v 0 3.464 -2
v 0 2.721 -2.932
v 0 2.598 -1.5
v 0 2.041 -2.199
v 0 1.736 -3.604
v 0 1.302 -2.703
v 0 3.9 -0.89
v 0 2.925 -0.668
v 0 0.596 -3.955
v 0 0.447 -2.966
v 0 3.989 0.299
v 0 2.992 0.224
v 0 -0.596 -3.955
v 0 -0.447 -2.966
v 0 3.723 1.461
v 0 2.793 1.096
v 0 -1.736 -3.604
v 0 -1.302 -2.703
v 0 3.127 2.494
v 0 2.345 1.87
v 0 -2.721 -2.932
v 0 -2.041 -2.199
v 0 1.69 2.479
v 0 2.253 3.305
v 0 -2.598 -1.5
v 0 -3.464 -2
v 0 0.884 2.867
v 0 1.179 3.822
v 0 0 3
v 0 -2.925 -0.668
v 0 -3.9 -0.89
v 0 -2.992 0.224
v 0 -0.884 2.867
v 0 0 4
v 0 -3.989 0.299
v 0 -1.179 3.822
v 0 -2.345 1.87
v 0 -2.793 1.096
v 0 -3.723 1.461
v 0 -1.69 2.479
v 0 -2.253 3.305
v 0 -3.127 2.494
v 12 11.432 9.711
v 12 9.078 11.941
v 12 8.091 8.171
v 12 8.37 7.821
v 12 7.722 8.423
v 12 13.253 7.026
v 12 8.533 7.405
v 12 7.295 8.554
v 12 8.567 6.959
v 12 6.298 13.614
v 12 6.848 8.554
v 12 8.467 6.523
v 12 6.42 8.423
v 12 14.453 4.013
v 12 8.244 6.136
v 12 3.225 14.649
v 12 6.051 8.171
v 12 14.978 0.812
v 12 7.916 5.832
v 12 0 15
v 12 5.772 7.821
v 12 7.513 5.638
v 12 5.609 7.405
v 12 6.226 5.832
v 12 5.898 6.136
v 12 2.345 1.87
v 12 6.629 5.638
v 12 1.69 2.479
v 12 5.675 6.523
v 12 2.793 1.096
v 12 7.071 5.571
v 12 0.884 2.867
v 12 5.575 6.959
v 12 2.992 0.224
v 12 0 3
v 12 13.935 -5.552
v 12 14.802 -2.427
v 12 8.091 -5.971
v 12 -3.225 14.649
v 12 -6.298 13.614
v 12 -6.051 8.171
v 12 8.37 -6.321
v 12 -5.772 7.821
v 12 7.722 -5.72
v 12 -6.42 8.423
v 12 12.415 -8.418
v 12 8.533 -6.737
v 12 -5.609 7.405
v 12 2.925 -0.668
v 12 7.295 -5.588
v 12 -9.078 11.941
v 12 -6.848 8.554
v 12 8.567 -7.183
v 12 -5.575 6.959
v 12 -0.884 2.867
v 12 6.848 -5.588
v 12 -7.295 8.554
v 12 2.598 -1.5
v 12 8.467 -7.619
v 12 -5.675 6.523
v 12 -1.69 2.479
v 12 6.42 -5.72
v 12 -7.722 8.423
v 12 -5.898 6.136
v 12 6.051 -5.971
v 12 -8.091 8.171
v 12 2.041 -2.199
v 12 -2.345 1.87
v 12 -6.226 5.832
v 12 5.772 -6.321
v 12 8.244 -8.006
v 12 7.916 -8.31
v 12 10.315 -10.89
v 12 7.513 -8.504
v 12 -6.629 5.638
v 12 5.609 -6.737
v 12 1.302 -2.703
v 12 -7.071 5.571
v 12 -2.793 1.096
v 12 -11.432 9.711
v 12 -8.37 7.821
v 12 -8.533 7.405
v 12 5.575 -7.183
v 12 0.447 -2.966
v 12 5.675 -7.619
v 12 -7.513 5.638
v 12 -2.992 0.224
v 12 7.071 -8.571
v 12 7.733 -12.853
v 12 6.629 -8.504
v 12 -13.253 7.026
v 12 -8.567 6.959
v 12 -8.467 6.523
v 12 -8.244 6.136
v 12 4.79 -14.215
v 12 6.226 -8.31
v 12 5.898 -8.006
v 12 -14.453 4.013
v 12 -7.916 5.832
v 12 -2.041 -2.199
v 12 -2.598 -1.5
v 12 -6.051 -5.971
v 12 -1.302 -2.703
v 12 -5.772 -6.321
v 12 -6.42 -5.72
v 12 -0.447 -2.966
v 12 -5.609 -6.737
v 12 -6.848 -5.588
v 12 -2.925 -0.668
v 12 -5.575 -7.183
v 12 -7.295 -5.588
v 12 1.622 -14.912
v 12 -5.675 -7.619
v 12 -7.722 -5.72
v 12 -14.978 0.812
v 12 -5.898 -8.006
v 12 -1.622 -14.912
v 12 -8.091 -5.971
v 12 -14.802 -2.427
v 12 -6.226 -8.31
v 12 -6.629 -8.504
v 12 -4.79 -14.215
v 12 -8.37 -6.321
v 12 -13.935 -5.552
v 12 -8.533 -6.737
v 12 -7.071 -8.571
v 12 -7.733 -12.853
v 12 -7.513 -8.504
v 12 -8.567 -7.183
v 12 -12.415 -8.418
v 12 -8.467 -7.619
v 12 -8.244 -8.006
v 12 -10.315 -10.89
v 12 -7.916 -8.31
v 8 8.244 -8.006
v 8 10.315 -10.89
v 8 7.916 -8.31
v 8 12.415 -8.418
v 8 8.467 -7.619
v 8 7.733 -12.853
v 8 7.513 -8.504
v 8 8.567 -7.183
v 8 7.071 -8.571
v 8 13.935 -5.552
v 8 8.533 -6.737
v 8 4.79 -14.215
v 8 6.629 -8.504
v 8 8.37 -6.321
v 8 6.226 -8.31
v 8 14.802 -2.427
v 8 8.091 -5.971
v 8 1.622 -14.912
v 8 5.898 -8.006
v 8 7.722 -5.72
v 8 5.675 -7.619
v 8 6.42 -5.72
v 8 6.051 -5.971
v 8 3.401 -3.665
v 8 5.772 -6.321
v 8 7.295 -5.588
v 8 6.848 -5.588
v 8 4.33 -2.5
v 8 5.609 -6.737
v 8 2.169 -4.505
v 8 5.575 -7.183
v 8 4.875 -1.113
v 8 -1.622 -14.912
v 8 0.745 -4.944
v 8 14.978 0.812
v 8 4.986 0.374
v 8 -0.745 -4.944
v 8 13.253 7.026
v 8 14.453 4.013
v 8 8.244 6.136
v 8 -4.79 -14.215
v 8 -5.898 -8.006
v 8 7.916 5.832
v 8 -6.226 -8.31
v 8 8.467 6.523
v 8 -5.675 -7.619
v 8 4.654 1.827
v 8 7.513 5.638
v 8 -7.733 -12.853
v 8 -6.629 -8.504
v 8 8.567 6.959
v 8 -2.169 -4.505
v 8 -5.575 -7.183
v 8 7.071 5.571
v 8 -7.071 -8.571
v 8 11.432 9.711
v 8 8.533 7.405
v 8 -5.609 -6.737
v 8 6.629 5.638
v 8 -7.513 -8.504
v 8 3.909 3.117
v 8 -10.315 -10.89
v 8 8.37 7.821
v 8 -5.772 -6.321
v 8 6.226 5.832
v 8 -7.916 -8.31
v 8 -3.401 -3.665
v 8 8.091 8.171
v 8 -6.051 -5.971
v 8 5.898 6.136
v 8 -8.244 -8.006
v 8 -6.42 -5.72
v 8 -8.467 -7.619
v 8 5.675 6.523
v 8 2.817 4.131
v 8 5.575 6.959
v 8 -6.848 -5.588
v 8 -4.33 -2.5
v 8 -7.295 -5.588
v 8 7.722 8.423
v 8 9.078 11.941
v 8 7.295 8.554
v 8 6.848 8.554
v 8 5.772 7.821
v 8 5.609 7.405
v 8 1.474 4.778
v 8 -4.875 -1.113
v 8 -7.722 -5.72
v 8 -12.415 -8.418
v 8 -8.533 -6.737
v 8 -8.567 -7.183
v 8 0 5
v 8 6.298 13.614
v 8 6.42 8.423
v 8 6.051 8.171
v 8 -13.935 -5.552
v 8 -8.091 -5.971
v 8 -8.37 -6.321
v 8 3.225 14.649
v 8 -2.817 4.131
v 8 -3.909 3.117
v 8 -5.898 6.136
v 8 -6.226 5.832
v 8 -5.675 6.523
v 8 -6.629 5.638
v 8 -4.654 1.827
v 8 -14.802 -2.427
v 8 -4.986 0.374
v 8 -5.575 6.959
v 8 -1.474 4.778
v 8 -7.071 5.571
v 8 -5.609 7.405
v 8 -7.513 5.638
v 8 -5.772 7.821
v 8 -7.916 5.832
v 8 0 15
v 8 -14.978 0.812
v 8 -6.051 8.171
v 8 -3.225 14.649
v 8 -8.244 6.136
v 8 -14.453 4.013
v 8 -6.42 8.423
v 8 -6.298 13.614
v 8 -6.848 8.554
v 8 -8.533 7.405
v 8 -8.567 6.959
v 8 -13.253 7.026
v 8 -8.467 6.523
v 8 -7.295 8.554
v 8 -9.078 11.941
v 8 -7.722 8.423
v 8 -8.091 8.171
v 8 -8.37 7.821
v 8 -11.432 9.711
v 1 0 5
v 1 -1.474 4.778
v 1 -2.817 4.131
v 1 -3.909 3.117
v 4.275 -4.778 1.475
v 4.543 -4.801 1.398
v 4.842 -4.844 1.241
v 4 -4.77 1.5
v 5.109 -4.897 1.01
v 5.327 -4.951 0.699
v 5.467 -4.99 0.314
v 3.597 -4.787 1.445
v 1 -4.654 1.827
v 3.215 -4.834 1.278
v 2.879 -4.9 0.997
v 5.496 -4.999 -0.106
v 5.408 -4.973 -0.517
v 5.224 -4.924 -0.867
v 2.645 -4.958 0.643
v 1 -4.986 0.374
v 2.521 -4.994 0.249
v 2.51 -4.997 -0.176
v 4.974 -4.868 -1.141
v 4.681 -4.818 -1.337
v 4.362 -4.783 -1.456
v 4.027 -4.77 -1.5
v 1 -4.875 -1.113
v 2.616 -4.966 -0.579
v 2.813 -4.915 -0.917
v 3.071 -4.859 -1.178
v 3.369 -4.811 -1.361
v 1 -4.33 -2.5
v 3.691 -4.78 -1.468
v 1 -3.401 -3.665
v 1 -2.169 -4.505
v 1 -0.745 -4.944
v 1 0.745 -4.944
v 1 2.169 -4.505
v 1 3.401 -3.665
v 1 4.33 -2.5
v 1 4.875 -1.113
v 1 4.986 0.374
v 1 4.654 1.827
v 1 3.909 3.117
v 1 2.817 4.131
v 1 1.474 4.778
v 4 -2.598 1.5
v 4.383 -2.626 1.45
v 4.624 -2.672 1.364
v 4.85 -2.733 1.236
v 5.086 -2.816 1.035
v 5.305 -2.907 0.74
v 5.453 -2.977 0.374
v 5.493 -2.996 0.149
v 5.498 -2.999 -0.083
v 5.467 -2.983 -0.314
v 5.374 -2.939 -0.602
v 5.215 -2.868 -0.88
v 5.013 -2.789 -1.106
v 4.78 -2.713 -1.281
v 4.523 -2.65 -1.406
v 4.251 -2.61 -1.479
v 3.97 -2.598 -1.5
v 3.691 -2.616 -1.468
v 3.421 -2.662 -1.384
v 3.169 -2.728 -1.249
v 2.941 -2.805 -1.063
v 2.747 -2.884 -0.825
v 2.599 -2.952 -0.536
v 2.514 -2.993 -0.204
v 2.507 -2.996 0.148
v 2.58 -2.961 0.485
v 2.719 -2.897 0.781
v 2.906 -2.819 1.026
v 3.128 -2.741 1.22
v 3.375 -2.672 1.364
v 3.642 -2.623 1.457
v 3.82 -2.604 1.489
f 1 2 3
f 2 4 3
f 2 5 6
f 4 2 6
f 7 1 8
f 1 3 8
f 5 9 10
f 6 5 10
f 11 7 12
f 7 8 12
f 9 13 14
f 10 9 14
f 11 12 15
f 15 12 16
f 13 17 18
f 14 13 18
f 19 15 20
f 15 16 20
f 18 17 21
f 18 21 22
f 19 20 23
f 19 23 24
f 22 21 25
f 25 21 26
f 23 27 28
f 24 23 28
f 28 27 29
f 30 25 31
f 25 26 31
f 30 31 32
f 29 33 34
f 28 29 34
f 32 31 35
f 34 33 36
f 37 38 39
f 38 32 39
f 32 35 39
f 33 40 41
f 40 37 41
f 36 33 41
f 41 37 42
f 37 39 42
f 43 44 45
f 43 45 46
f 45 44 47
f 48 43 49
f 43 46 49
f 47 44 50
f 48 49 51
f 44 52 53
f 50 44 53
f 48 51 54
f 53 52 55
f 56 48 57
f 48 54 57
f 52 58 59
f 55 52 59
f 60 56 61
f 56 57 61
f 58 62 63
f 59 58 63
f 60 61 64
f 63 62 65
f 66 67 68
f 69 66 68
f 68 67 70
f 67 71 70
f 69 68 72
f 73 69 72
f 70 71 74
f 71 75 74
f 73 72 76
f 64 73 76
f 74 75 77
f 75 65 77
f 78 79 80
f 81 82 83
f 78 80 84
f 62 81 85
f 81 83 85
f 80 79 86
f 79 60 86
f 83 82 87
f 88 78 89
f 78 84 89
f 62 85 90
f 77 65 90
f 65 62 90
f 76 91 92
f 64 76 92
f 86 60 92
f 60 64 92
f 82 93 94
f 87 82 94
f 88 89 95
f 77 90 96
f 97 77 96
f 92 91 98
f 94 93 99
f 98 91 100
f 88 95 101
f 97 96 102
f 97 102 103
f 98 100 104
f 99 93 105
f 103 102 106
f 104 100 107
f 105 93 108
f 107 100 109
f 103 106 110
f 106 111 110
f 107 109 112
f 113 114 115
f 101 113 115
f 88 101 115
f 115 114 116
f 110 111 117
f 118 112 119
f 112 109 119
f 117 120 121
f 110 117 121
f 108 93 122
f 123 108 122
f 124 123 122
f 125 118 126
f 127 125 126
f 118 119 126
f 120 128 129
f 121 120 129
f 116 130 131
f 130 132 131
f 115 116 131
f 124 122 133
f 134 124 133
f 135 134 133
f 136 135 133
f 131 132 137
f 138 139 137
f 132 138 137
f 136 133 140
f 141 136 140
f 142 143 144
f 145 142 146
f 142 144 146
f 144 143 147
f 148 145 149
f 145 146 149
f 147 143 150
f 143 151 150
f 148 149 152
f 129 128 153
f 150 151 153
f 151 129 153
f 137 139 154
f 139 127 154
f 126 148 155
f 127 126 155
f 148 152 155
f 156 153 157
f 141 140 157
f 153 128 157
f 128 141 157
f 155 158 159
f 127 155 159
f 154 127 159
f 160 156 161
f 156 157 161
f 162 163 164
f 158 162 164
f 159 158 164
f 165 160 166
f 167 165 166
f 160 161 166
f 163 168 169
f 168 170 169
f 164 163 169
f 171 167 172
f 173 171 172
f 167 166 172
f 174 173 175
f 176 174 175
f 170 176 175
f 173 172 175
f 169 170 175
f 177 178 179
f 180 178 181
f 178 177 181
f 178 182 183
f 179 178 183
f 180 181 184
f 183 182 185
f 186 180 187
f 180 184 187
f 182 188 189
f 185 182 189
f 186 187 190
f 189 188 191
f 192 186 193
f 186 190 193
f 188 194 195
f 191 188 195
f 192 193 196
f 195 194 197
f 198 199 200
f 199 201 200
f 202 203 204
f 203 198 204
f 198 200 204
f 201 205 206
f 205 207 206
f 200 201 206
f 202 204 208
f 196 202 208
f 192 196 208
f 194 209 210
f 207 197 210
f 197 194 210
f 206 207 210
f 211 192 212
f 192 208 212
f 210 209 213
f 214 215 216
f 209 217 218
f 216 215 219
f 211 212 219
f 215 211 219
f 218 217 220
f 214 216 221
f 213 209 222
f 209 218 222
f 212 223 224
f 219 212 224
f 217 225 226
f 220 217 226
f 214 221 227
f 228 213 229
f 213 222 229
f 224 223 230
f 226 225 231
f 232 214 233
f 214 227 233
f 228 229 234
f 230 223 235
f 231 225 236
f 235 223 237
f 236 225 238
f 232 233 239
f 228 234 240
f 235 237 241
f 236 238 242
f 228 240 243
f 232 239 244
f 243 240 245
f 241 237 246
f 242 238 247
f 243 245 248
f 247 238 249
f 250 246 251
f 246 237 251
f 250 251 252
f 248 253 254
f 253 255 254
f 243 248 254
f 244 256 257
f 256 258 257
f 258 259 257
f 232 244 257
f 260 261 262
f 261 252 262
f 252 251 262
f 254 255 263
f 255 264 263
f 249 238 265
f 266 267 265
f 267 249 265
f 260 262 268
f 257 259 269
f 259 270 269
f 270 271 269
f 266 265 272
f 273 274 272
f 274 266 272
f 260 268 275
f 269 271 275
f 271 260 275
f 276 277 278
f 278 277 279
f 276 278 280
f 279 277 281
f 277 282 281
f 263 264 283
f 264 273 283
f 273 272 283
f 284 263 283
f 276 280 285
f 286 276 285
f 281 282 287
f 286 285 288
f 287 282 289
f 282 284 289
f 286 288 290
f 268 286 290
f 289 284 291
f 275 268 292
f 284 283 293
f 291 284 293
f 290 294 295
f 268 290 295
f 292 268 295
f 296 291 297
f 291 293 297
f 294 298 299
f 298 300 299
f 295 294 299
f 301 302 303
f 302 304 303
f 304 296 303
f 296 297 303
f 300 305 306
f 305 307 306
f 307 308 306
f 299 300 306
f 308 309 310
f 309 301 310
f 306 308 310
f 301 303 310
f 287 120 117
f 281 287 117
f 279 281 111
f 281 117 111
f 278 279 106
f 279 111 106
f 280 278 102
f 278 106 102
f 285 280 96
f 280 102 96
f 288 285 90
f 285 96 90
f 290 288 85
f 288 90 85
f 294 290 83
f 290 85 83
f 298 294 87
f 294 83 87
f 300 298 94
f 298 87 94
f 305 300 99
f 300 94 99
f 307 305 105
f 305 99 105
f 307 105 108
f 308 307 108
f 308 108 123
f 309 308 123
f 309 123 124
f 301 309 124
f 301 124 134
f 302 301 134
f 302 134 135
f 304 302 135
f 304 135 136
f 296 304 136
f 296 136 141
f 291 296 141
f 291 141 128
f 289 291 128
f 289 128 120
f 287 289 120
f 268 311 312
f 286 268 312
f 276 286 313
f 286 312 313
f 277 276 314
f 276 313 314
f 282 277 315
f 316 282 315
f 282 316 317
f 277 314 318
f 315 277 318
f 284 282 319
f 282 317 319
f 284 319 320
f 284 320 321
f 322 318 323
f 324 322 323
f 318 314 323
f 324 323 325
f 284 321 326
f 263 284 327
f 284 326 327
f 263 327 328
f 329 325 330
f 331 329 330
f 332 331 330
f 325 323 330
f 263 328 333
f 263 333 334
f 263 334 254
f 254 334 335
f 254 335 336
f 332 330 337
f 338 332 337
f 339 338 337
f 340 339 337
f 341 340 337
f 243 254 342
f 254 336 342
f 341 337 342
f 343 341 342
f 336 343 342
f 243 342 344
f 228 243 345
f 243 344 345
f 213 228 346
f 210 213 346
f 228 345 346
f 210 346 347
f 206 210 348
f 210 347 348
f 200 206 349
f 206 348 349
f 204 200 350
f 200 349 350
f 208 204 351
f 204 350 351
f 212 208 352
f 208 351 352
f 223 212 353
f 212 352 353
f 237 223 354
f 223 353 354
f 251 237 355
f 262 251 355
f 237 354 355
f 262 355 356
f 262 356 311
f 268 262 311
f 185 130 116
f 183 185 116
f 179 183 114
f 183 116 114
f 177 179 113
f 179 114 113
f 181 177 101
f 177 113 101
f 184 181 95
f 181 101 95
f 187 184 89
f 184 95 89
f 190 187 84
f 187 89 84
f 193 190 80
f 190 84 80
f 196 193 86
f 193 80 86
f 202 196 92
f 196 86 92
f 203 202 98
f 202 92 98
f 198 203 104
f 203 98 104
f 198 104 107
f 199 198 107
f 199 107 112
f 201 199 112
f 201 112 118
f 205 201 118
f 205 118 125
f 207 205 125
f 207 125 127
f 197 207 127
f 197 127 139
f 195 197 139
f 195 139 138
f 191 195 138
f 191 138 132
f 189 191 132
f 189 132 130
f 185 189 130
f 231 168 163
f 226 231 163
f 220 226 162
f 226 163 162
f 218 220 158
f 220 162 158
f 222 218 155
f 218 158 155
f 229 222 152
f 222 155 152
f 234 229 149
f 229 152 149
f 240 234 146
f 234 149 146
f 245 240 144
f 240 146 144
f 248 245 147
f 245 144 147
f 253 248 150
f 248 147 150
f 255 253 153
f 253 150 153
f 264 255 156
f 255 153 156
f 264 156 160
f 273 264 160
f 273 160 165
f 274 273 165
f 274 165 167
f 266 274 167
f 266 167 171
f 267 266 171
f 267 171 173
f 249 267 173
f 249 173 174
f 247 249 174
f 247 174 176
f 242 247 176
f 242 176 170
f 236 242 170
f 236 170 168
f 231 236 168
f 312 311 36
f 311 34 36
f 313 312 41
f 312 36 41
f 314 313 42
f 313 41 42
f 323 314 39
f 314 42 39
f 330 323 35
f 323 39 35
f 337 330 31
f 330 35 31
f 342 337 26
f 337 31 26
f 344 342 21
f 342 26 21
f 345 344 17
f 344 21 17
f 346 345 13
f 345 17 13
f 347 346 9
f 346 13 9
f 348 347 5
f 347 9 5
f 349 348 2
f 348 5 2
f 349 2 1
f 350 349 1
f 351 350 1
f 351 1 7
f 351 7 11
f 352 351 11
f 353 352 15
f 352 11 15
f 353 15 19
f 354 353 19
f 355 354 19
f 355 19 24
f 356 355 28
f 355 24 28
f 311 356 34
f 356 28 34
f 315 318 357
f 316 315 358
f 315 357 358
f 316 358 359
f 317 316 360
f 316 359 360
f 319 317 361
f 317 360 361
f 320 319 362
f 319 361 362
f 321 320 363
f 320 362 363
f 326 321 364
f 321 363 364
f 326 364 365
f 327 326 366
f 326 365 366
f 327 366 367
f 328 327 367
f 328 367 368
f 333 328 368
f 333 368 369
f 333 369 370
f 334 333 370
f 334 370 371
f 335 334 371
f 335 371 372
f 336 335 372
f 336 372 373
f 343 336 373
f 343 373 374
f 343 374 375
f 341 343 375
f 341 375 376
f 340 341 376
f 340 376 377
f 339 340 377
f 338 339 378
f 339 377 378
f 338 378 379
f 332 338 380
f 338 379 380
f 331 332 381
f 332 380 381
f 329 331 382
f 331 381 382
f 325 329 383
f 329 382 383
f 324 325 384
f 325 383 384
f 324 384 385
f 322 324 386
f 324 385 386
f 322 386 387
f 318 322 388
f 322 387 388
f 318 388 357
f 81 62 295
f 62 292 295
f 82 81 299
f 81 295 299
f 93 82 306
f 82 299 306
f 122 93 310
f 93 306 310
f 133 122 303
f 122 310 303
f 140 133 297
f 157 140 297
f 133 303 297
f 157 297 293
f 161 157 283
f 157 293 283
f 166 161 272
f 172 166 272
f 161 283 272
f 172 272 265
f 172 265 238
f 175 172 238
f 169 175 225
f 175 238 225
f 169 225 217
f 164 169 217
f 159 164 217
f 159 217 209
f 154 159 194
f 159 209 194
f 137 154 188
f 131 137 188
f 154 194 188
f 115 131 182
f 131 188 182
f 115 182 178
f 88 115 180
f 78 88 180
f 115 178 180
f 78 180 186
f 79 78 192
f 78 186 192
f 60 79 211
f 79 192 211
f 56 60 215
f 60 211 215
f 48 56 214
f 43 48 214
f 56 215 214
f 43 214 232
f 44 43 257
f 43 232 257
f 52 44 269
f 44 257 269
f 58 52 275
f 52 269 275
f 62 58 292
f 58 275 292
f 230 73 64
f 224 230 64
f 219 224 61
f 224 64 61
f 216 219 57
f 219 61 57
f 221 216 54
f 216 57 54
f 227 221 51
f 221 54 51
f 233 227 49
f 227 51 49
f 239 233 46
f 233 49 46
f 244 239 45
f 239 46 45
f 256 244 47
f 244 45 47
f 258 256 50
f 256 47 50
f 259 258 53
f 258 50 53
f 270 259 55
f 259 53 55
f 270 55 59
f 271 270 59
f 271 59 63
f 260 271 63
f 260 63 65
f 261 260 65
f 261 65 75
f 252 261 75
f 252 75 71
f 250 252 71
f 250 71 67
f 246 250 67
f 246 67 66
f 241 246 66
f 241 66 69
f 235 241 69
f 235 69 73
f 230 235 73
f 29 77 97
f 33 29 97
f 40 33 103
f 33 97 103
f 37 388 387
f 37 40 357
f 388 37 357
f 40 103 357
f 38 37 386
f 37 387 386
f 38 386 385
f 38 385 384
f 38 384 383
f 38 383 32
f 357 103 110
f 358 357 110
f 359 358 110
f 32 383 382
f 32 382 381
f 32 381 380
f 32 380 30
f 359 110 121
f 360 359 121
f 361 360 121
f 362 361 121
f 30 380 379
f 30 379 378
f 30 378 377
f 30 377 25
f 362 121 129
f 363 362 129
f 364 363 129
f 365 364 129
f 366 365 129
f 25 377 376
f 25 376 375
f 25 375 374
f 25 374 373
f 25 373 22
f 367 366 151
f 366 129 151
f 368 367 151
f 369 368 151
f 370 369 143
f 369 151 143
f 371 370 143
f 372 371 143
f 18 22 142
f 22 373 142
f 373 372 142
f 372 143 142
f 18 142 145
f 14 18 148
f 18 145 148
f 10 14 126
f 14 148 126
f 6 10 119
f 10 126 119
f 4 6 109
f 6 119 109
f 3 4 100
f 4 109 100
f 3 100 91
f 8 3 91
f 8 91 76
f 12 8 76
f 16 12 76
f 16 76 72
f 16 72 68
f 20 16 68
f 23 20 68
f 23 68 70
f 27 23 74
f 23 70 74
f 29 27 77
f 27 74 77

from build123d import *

# Parameters (mm, degrees)
SKETCH2_R          = 1.5
CUT_EXTRUDE1_DEPTH = 5
SKETCH3_R          = 1.5
CUT_EXTRUDE2_DEPTH = 25.372115263


with BuildPart() as part:
    # Sketch1 → Revolve1 (revolve)
    with BuildSketch(Plane.XY, mode=Mode.PRIVATE) as revolve1_sk:
        Polygon((12, 3), (12, 15), (8, 15), (8, 5), (1, 5), (0, 4), (0, 3), align=None)
    revolve(revolve1_sk.sketch.rotate(Axis((0, 0, 0), (1, 0, 0)), 90), axis=Axis((0, 0, 0), (1, 0, 0)))

    # Sketch2 → Cut-Extrude1 (cut)
    with BuildSketch(Plane(origin=(0, 0, 0), x_dir=(1, 0, 0), z_dir=(0, 1, 0))):
        with Locations(Location((4, 0, 0), (0, 0, 270))):
            Circle(SKETCH2_R)
    extrude(amount=-CUT_EXTRUDE1_DEPTH, mode=Mode.SUBTRACT)

    # Sketch3 → Cut-Extrude2 (cut, through all)
    with BuildSketch(Plane(origin=(12, 0, 0), x_dir=(0, 0, -1), z_dir=(1, 0, 0))):
        with Locations((-7.071067812, 7.071067812)):
            Circle(SKETCH3_R)
        with Locations((7.071067812, 7.071067812)):
            Circle(SKETCH3_R)
        with Locations((7.071067812, -7.071067812)):
            Circle(SKETCH3_R)
        with Locations((-7.071067812, -7.071067812)):
            Circle(SKETCH3_R)
    extrude(amount=-CUT_EXTRUDE2_DEPTH, mode=Mode.SUBTRACT)


solid = part.part
